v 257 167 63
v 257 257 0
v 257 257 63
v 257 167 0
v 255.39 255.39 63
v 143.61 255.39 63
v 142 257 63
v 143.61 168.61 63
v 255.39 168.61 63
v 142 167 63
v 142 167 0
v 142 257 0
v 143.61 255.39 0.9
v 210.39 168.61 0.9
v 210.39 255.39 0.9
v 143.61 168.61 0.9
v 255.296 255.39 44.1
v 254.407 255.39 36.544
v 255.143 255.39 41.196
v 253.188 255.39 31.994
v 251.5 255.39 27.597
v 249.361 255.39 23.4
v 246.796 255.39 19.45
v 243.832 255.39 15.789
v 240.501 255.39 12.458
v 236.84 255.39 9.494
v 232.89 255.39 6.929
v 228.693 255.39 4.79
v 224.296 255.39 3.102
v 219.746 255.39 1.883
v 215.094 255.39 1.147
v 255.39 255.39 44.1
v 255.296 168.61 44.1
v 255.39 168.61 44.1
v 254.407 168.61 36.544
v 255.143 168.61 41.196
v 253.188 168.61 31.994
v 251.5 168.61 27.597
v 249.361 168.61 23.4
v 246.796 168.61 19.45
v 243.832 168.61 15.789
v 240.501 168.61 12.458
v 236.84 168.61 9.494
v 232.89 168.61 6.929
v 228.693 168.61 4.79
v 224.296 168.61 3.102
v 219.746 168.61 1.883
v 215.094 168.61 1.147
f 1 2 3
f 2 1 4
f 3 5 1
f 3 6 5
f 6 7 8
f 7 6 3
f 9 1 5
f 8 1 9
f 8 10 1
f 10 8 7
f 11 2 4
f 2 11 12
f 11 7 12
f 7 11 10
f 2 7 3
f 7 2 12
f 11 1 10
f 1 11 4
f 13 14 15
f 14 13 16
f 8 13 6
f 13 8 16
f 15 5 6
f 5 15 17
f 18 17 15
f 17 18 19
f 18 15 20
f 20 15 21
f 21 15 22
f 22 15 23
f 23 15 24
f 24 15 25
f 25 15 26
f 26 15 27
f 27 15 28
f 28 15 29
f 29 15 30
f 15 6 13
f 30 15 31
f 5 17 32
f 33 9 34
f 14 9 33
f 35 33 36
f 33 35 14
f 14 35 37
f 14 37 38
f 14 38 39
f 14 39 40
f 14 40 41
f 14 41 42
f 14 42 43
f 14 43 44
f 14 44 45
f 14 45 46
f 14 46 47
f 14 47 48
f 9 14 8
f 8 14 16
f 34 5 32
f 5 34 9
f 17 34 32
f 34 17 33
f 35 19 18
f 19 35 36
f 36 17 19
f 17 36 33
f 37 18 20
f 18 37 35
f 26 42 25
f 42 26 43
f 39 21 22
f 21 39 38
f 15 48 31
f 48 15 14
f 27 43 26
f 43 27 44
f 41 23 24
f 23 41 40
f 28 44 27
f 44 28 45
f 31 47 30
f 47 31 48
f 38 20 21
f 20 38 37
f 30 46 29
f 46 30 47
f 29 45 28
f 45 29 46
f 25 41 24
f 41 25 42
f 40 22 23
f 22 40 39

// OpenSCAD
% cube([258, 258, 64]);

// cards are 62x93
// cardboard is 63x102

// 20mm of crisis cards
// 30mm of door cards

$fn=60;


if (0) {
translate([0,90,0]) tenCharBox();
resourceBox();
translate([0,45,0]) resourceBox();
translate([143,0,0]) rotate([0,0,90]) villianBox();
translate([108+34,0,0]) misc1();
}

translate([108+34,167,0]) misc2();

module misc2() {
   wid = 257-108-34;
   len = 257-167;
   rad = 45;

   difference() {
      cube([wid,len,63]);

      translate([1.61,1.61,0.9]) cube([wid-2*1.61-rad,len-2*1.61,63]);
      translate([1.61,1.61,rad+-.9]) cube([wid-2*1.61,len-2*1.61,63]);

      translate([wid-1.61-rad,1.61,0.9+rad]) rotate([-90,0,0]) cylinder(r=rad,h=len-2*1.61);
   }
}

module misc1() {
   wid = 257-108-34;
   len = 167;
   rad = 45;

   difference() {
      cube([wid,len,63]);

      translate([1.61,1.61,0.9]) cube([wid-2*1.61-rad,len-2*1.61,63]);
      translate([1.61,1.61,rad+-.9]) cube([wid-2*1.61,len-2*1.61,63]);

      translate([wid-1.61-rad,1.61,0.9+rad]) rotate([-90,0,0]) cylinder(r=rad,h=len-2*1.61);
   }
}


// 34 x 257 x 63
module villianBox() {
   difference() {
      cube([167+2*45,34,63]);

      translate([(108-93)/2,1.61,0.9]) cube([93,34-2*1.61,64]);
      translate([(108-68)/2,-1,40]) cube([68,180,60]);
      translate([(108-93)/2+103.25,1.61,0.9]) cube([93,34-2*1.61,64]);
      translate([(108-68)/2+103.25,-1,40]) cube([68,180,60]);
   }
}

// 108 x 167 x 63
module tenCharBox() {
   difference() {
      cube([108,167,63]);

      translate([15,-1,40]) cube([68,180,60]);
      for (i=[0:9]) {
         translate([2,2+i*16.5,1.2]) CharBoxCutout();
      }
   }
}

module CharBoxCutout() {
   translate([0,0,0.6]) {
      translate([0,9.9,0]) cube([104, 4, 64]);
      translate([0,0,1.2]) cube([93, 10, 64]);
   }
}

// 108 x 45 x 63
module resourceBox() {
   difference() {
      thick = 45;
      // cube([93+2*1.61, 45+2*1.61, 63]);
      cube([108, 45, 63]);

      translate([(108-93)/2,1.61,0.9]) cube([93,thick-2*1.61,64]);
      translate([(108-68)/2,-1,40]) cube([68,180,60]);
      translate([(108-68)/2+68/2,-1,42]) rotate([-90,0,0]) cylinder(d=68,h=10);
   }
}
